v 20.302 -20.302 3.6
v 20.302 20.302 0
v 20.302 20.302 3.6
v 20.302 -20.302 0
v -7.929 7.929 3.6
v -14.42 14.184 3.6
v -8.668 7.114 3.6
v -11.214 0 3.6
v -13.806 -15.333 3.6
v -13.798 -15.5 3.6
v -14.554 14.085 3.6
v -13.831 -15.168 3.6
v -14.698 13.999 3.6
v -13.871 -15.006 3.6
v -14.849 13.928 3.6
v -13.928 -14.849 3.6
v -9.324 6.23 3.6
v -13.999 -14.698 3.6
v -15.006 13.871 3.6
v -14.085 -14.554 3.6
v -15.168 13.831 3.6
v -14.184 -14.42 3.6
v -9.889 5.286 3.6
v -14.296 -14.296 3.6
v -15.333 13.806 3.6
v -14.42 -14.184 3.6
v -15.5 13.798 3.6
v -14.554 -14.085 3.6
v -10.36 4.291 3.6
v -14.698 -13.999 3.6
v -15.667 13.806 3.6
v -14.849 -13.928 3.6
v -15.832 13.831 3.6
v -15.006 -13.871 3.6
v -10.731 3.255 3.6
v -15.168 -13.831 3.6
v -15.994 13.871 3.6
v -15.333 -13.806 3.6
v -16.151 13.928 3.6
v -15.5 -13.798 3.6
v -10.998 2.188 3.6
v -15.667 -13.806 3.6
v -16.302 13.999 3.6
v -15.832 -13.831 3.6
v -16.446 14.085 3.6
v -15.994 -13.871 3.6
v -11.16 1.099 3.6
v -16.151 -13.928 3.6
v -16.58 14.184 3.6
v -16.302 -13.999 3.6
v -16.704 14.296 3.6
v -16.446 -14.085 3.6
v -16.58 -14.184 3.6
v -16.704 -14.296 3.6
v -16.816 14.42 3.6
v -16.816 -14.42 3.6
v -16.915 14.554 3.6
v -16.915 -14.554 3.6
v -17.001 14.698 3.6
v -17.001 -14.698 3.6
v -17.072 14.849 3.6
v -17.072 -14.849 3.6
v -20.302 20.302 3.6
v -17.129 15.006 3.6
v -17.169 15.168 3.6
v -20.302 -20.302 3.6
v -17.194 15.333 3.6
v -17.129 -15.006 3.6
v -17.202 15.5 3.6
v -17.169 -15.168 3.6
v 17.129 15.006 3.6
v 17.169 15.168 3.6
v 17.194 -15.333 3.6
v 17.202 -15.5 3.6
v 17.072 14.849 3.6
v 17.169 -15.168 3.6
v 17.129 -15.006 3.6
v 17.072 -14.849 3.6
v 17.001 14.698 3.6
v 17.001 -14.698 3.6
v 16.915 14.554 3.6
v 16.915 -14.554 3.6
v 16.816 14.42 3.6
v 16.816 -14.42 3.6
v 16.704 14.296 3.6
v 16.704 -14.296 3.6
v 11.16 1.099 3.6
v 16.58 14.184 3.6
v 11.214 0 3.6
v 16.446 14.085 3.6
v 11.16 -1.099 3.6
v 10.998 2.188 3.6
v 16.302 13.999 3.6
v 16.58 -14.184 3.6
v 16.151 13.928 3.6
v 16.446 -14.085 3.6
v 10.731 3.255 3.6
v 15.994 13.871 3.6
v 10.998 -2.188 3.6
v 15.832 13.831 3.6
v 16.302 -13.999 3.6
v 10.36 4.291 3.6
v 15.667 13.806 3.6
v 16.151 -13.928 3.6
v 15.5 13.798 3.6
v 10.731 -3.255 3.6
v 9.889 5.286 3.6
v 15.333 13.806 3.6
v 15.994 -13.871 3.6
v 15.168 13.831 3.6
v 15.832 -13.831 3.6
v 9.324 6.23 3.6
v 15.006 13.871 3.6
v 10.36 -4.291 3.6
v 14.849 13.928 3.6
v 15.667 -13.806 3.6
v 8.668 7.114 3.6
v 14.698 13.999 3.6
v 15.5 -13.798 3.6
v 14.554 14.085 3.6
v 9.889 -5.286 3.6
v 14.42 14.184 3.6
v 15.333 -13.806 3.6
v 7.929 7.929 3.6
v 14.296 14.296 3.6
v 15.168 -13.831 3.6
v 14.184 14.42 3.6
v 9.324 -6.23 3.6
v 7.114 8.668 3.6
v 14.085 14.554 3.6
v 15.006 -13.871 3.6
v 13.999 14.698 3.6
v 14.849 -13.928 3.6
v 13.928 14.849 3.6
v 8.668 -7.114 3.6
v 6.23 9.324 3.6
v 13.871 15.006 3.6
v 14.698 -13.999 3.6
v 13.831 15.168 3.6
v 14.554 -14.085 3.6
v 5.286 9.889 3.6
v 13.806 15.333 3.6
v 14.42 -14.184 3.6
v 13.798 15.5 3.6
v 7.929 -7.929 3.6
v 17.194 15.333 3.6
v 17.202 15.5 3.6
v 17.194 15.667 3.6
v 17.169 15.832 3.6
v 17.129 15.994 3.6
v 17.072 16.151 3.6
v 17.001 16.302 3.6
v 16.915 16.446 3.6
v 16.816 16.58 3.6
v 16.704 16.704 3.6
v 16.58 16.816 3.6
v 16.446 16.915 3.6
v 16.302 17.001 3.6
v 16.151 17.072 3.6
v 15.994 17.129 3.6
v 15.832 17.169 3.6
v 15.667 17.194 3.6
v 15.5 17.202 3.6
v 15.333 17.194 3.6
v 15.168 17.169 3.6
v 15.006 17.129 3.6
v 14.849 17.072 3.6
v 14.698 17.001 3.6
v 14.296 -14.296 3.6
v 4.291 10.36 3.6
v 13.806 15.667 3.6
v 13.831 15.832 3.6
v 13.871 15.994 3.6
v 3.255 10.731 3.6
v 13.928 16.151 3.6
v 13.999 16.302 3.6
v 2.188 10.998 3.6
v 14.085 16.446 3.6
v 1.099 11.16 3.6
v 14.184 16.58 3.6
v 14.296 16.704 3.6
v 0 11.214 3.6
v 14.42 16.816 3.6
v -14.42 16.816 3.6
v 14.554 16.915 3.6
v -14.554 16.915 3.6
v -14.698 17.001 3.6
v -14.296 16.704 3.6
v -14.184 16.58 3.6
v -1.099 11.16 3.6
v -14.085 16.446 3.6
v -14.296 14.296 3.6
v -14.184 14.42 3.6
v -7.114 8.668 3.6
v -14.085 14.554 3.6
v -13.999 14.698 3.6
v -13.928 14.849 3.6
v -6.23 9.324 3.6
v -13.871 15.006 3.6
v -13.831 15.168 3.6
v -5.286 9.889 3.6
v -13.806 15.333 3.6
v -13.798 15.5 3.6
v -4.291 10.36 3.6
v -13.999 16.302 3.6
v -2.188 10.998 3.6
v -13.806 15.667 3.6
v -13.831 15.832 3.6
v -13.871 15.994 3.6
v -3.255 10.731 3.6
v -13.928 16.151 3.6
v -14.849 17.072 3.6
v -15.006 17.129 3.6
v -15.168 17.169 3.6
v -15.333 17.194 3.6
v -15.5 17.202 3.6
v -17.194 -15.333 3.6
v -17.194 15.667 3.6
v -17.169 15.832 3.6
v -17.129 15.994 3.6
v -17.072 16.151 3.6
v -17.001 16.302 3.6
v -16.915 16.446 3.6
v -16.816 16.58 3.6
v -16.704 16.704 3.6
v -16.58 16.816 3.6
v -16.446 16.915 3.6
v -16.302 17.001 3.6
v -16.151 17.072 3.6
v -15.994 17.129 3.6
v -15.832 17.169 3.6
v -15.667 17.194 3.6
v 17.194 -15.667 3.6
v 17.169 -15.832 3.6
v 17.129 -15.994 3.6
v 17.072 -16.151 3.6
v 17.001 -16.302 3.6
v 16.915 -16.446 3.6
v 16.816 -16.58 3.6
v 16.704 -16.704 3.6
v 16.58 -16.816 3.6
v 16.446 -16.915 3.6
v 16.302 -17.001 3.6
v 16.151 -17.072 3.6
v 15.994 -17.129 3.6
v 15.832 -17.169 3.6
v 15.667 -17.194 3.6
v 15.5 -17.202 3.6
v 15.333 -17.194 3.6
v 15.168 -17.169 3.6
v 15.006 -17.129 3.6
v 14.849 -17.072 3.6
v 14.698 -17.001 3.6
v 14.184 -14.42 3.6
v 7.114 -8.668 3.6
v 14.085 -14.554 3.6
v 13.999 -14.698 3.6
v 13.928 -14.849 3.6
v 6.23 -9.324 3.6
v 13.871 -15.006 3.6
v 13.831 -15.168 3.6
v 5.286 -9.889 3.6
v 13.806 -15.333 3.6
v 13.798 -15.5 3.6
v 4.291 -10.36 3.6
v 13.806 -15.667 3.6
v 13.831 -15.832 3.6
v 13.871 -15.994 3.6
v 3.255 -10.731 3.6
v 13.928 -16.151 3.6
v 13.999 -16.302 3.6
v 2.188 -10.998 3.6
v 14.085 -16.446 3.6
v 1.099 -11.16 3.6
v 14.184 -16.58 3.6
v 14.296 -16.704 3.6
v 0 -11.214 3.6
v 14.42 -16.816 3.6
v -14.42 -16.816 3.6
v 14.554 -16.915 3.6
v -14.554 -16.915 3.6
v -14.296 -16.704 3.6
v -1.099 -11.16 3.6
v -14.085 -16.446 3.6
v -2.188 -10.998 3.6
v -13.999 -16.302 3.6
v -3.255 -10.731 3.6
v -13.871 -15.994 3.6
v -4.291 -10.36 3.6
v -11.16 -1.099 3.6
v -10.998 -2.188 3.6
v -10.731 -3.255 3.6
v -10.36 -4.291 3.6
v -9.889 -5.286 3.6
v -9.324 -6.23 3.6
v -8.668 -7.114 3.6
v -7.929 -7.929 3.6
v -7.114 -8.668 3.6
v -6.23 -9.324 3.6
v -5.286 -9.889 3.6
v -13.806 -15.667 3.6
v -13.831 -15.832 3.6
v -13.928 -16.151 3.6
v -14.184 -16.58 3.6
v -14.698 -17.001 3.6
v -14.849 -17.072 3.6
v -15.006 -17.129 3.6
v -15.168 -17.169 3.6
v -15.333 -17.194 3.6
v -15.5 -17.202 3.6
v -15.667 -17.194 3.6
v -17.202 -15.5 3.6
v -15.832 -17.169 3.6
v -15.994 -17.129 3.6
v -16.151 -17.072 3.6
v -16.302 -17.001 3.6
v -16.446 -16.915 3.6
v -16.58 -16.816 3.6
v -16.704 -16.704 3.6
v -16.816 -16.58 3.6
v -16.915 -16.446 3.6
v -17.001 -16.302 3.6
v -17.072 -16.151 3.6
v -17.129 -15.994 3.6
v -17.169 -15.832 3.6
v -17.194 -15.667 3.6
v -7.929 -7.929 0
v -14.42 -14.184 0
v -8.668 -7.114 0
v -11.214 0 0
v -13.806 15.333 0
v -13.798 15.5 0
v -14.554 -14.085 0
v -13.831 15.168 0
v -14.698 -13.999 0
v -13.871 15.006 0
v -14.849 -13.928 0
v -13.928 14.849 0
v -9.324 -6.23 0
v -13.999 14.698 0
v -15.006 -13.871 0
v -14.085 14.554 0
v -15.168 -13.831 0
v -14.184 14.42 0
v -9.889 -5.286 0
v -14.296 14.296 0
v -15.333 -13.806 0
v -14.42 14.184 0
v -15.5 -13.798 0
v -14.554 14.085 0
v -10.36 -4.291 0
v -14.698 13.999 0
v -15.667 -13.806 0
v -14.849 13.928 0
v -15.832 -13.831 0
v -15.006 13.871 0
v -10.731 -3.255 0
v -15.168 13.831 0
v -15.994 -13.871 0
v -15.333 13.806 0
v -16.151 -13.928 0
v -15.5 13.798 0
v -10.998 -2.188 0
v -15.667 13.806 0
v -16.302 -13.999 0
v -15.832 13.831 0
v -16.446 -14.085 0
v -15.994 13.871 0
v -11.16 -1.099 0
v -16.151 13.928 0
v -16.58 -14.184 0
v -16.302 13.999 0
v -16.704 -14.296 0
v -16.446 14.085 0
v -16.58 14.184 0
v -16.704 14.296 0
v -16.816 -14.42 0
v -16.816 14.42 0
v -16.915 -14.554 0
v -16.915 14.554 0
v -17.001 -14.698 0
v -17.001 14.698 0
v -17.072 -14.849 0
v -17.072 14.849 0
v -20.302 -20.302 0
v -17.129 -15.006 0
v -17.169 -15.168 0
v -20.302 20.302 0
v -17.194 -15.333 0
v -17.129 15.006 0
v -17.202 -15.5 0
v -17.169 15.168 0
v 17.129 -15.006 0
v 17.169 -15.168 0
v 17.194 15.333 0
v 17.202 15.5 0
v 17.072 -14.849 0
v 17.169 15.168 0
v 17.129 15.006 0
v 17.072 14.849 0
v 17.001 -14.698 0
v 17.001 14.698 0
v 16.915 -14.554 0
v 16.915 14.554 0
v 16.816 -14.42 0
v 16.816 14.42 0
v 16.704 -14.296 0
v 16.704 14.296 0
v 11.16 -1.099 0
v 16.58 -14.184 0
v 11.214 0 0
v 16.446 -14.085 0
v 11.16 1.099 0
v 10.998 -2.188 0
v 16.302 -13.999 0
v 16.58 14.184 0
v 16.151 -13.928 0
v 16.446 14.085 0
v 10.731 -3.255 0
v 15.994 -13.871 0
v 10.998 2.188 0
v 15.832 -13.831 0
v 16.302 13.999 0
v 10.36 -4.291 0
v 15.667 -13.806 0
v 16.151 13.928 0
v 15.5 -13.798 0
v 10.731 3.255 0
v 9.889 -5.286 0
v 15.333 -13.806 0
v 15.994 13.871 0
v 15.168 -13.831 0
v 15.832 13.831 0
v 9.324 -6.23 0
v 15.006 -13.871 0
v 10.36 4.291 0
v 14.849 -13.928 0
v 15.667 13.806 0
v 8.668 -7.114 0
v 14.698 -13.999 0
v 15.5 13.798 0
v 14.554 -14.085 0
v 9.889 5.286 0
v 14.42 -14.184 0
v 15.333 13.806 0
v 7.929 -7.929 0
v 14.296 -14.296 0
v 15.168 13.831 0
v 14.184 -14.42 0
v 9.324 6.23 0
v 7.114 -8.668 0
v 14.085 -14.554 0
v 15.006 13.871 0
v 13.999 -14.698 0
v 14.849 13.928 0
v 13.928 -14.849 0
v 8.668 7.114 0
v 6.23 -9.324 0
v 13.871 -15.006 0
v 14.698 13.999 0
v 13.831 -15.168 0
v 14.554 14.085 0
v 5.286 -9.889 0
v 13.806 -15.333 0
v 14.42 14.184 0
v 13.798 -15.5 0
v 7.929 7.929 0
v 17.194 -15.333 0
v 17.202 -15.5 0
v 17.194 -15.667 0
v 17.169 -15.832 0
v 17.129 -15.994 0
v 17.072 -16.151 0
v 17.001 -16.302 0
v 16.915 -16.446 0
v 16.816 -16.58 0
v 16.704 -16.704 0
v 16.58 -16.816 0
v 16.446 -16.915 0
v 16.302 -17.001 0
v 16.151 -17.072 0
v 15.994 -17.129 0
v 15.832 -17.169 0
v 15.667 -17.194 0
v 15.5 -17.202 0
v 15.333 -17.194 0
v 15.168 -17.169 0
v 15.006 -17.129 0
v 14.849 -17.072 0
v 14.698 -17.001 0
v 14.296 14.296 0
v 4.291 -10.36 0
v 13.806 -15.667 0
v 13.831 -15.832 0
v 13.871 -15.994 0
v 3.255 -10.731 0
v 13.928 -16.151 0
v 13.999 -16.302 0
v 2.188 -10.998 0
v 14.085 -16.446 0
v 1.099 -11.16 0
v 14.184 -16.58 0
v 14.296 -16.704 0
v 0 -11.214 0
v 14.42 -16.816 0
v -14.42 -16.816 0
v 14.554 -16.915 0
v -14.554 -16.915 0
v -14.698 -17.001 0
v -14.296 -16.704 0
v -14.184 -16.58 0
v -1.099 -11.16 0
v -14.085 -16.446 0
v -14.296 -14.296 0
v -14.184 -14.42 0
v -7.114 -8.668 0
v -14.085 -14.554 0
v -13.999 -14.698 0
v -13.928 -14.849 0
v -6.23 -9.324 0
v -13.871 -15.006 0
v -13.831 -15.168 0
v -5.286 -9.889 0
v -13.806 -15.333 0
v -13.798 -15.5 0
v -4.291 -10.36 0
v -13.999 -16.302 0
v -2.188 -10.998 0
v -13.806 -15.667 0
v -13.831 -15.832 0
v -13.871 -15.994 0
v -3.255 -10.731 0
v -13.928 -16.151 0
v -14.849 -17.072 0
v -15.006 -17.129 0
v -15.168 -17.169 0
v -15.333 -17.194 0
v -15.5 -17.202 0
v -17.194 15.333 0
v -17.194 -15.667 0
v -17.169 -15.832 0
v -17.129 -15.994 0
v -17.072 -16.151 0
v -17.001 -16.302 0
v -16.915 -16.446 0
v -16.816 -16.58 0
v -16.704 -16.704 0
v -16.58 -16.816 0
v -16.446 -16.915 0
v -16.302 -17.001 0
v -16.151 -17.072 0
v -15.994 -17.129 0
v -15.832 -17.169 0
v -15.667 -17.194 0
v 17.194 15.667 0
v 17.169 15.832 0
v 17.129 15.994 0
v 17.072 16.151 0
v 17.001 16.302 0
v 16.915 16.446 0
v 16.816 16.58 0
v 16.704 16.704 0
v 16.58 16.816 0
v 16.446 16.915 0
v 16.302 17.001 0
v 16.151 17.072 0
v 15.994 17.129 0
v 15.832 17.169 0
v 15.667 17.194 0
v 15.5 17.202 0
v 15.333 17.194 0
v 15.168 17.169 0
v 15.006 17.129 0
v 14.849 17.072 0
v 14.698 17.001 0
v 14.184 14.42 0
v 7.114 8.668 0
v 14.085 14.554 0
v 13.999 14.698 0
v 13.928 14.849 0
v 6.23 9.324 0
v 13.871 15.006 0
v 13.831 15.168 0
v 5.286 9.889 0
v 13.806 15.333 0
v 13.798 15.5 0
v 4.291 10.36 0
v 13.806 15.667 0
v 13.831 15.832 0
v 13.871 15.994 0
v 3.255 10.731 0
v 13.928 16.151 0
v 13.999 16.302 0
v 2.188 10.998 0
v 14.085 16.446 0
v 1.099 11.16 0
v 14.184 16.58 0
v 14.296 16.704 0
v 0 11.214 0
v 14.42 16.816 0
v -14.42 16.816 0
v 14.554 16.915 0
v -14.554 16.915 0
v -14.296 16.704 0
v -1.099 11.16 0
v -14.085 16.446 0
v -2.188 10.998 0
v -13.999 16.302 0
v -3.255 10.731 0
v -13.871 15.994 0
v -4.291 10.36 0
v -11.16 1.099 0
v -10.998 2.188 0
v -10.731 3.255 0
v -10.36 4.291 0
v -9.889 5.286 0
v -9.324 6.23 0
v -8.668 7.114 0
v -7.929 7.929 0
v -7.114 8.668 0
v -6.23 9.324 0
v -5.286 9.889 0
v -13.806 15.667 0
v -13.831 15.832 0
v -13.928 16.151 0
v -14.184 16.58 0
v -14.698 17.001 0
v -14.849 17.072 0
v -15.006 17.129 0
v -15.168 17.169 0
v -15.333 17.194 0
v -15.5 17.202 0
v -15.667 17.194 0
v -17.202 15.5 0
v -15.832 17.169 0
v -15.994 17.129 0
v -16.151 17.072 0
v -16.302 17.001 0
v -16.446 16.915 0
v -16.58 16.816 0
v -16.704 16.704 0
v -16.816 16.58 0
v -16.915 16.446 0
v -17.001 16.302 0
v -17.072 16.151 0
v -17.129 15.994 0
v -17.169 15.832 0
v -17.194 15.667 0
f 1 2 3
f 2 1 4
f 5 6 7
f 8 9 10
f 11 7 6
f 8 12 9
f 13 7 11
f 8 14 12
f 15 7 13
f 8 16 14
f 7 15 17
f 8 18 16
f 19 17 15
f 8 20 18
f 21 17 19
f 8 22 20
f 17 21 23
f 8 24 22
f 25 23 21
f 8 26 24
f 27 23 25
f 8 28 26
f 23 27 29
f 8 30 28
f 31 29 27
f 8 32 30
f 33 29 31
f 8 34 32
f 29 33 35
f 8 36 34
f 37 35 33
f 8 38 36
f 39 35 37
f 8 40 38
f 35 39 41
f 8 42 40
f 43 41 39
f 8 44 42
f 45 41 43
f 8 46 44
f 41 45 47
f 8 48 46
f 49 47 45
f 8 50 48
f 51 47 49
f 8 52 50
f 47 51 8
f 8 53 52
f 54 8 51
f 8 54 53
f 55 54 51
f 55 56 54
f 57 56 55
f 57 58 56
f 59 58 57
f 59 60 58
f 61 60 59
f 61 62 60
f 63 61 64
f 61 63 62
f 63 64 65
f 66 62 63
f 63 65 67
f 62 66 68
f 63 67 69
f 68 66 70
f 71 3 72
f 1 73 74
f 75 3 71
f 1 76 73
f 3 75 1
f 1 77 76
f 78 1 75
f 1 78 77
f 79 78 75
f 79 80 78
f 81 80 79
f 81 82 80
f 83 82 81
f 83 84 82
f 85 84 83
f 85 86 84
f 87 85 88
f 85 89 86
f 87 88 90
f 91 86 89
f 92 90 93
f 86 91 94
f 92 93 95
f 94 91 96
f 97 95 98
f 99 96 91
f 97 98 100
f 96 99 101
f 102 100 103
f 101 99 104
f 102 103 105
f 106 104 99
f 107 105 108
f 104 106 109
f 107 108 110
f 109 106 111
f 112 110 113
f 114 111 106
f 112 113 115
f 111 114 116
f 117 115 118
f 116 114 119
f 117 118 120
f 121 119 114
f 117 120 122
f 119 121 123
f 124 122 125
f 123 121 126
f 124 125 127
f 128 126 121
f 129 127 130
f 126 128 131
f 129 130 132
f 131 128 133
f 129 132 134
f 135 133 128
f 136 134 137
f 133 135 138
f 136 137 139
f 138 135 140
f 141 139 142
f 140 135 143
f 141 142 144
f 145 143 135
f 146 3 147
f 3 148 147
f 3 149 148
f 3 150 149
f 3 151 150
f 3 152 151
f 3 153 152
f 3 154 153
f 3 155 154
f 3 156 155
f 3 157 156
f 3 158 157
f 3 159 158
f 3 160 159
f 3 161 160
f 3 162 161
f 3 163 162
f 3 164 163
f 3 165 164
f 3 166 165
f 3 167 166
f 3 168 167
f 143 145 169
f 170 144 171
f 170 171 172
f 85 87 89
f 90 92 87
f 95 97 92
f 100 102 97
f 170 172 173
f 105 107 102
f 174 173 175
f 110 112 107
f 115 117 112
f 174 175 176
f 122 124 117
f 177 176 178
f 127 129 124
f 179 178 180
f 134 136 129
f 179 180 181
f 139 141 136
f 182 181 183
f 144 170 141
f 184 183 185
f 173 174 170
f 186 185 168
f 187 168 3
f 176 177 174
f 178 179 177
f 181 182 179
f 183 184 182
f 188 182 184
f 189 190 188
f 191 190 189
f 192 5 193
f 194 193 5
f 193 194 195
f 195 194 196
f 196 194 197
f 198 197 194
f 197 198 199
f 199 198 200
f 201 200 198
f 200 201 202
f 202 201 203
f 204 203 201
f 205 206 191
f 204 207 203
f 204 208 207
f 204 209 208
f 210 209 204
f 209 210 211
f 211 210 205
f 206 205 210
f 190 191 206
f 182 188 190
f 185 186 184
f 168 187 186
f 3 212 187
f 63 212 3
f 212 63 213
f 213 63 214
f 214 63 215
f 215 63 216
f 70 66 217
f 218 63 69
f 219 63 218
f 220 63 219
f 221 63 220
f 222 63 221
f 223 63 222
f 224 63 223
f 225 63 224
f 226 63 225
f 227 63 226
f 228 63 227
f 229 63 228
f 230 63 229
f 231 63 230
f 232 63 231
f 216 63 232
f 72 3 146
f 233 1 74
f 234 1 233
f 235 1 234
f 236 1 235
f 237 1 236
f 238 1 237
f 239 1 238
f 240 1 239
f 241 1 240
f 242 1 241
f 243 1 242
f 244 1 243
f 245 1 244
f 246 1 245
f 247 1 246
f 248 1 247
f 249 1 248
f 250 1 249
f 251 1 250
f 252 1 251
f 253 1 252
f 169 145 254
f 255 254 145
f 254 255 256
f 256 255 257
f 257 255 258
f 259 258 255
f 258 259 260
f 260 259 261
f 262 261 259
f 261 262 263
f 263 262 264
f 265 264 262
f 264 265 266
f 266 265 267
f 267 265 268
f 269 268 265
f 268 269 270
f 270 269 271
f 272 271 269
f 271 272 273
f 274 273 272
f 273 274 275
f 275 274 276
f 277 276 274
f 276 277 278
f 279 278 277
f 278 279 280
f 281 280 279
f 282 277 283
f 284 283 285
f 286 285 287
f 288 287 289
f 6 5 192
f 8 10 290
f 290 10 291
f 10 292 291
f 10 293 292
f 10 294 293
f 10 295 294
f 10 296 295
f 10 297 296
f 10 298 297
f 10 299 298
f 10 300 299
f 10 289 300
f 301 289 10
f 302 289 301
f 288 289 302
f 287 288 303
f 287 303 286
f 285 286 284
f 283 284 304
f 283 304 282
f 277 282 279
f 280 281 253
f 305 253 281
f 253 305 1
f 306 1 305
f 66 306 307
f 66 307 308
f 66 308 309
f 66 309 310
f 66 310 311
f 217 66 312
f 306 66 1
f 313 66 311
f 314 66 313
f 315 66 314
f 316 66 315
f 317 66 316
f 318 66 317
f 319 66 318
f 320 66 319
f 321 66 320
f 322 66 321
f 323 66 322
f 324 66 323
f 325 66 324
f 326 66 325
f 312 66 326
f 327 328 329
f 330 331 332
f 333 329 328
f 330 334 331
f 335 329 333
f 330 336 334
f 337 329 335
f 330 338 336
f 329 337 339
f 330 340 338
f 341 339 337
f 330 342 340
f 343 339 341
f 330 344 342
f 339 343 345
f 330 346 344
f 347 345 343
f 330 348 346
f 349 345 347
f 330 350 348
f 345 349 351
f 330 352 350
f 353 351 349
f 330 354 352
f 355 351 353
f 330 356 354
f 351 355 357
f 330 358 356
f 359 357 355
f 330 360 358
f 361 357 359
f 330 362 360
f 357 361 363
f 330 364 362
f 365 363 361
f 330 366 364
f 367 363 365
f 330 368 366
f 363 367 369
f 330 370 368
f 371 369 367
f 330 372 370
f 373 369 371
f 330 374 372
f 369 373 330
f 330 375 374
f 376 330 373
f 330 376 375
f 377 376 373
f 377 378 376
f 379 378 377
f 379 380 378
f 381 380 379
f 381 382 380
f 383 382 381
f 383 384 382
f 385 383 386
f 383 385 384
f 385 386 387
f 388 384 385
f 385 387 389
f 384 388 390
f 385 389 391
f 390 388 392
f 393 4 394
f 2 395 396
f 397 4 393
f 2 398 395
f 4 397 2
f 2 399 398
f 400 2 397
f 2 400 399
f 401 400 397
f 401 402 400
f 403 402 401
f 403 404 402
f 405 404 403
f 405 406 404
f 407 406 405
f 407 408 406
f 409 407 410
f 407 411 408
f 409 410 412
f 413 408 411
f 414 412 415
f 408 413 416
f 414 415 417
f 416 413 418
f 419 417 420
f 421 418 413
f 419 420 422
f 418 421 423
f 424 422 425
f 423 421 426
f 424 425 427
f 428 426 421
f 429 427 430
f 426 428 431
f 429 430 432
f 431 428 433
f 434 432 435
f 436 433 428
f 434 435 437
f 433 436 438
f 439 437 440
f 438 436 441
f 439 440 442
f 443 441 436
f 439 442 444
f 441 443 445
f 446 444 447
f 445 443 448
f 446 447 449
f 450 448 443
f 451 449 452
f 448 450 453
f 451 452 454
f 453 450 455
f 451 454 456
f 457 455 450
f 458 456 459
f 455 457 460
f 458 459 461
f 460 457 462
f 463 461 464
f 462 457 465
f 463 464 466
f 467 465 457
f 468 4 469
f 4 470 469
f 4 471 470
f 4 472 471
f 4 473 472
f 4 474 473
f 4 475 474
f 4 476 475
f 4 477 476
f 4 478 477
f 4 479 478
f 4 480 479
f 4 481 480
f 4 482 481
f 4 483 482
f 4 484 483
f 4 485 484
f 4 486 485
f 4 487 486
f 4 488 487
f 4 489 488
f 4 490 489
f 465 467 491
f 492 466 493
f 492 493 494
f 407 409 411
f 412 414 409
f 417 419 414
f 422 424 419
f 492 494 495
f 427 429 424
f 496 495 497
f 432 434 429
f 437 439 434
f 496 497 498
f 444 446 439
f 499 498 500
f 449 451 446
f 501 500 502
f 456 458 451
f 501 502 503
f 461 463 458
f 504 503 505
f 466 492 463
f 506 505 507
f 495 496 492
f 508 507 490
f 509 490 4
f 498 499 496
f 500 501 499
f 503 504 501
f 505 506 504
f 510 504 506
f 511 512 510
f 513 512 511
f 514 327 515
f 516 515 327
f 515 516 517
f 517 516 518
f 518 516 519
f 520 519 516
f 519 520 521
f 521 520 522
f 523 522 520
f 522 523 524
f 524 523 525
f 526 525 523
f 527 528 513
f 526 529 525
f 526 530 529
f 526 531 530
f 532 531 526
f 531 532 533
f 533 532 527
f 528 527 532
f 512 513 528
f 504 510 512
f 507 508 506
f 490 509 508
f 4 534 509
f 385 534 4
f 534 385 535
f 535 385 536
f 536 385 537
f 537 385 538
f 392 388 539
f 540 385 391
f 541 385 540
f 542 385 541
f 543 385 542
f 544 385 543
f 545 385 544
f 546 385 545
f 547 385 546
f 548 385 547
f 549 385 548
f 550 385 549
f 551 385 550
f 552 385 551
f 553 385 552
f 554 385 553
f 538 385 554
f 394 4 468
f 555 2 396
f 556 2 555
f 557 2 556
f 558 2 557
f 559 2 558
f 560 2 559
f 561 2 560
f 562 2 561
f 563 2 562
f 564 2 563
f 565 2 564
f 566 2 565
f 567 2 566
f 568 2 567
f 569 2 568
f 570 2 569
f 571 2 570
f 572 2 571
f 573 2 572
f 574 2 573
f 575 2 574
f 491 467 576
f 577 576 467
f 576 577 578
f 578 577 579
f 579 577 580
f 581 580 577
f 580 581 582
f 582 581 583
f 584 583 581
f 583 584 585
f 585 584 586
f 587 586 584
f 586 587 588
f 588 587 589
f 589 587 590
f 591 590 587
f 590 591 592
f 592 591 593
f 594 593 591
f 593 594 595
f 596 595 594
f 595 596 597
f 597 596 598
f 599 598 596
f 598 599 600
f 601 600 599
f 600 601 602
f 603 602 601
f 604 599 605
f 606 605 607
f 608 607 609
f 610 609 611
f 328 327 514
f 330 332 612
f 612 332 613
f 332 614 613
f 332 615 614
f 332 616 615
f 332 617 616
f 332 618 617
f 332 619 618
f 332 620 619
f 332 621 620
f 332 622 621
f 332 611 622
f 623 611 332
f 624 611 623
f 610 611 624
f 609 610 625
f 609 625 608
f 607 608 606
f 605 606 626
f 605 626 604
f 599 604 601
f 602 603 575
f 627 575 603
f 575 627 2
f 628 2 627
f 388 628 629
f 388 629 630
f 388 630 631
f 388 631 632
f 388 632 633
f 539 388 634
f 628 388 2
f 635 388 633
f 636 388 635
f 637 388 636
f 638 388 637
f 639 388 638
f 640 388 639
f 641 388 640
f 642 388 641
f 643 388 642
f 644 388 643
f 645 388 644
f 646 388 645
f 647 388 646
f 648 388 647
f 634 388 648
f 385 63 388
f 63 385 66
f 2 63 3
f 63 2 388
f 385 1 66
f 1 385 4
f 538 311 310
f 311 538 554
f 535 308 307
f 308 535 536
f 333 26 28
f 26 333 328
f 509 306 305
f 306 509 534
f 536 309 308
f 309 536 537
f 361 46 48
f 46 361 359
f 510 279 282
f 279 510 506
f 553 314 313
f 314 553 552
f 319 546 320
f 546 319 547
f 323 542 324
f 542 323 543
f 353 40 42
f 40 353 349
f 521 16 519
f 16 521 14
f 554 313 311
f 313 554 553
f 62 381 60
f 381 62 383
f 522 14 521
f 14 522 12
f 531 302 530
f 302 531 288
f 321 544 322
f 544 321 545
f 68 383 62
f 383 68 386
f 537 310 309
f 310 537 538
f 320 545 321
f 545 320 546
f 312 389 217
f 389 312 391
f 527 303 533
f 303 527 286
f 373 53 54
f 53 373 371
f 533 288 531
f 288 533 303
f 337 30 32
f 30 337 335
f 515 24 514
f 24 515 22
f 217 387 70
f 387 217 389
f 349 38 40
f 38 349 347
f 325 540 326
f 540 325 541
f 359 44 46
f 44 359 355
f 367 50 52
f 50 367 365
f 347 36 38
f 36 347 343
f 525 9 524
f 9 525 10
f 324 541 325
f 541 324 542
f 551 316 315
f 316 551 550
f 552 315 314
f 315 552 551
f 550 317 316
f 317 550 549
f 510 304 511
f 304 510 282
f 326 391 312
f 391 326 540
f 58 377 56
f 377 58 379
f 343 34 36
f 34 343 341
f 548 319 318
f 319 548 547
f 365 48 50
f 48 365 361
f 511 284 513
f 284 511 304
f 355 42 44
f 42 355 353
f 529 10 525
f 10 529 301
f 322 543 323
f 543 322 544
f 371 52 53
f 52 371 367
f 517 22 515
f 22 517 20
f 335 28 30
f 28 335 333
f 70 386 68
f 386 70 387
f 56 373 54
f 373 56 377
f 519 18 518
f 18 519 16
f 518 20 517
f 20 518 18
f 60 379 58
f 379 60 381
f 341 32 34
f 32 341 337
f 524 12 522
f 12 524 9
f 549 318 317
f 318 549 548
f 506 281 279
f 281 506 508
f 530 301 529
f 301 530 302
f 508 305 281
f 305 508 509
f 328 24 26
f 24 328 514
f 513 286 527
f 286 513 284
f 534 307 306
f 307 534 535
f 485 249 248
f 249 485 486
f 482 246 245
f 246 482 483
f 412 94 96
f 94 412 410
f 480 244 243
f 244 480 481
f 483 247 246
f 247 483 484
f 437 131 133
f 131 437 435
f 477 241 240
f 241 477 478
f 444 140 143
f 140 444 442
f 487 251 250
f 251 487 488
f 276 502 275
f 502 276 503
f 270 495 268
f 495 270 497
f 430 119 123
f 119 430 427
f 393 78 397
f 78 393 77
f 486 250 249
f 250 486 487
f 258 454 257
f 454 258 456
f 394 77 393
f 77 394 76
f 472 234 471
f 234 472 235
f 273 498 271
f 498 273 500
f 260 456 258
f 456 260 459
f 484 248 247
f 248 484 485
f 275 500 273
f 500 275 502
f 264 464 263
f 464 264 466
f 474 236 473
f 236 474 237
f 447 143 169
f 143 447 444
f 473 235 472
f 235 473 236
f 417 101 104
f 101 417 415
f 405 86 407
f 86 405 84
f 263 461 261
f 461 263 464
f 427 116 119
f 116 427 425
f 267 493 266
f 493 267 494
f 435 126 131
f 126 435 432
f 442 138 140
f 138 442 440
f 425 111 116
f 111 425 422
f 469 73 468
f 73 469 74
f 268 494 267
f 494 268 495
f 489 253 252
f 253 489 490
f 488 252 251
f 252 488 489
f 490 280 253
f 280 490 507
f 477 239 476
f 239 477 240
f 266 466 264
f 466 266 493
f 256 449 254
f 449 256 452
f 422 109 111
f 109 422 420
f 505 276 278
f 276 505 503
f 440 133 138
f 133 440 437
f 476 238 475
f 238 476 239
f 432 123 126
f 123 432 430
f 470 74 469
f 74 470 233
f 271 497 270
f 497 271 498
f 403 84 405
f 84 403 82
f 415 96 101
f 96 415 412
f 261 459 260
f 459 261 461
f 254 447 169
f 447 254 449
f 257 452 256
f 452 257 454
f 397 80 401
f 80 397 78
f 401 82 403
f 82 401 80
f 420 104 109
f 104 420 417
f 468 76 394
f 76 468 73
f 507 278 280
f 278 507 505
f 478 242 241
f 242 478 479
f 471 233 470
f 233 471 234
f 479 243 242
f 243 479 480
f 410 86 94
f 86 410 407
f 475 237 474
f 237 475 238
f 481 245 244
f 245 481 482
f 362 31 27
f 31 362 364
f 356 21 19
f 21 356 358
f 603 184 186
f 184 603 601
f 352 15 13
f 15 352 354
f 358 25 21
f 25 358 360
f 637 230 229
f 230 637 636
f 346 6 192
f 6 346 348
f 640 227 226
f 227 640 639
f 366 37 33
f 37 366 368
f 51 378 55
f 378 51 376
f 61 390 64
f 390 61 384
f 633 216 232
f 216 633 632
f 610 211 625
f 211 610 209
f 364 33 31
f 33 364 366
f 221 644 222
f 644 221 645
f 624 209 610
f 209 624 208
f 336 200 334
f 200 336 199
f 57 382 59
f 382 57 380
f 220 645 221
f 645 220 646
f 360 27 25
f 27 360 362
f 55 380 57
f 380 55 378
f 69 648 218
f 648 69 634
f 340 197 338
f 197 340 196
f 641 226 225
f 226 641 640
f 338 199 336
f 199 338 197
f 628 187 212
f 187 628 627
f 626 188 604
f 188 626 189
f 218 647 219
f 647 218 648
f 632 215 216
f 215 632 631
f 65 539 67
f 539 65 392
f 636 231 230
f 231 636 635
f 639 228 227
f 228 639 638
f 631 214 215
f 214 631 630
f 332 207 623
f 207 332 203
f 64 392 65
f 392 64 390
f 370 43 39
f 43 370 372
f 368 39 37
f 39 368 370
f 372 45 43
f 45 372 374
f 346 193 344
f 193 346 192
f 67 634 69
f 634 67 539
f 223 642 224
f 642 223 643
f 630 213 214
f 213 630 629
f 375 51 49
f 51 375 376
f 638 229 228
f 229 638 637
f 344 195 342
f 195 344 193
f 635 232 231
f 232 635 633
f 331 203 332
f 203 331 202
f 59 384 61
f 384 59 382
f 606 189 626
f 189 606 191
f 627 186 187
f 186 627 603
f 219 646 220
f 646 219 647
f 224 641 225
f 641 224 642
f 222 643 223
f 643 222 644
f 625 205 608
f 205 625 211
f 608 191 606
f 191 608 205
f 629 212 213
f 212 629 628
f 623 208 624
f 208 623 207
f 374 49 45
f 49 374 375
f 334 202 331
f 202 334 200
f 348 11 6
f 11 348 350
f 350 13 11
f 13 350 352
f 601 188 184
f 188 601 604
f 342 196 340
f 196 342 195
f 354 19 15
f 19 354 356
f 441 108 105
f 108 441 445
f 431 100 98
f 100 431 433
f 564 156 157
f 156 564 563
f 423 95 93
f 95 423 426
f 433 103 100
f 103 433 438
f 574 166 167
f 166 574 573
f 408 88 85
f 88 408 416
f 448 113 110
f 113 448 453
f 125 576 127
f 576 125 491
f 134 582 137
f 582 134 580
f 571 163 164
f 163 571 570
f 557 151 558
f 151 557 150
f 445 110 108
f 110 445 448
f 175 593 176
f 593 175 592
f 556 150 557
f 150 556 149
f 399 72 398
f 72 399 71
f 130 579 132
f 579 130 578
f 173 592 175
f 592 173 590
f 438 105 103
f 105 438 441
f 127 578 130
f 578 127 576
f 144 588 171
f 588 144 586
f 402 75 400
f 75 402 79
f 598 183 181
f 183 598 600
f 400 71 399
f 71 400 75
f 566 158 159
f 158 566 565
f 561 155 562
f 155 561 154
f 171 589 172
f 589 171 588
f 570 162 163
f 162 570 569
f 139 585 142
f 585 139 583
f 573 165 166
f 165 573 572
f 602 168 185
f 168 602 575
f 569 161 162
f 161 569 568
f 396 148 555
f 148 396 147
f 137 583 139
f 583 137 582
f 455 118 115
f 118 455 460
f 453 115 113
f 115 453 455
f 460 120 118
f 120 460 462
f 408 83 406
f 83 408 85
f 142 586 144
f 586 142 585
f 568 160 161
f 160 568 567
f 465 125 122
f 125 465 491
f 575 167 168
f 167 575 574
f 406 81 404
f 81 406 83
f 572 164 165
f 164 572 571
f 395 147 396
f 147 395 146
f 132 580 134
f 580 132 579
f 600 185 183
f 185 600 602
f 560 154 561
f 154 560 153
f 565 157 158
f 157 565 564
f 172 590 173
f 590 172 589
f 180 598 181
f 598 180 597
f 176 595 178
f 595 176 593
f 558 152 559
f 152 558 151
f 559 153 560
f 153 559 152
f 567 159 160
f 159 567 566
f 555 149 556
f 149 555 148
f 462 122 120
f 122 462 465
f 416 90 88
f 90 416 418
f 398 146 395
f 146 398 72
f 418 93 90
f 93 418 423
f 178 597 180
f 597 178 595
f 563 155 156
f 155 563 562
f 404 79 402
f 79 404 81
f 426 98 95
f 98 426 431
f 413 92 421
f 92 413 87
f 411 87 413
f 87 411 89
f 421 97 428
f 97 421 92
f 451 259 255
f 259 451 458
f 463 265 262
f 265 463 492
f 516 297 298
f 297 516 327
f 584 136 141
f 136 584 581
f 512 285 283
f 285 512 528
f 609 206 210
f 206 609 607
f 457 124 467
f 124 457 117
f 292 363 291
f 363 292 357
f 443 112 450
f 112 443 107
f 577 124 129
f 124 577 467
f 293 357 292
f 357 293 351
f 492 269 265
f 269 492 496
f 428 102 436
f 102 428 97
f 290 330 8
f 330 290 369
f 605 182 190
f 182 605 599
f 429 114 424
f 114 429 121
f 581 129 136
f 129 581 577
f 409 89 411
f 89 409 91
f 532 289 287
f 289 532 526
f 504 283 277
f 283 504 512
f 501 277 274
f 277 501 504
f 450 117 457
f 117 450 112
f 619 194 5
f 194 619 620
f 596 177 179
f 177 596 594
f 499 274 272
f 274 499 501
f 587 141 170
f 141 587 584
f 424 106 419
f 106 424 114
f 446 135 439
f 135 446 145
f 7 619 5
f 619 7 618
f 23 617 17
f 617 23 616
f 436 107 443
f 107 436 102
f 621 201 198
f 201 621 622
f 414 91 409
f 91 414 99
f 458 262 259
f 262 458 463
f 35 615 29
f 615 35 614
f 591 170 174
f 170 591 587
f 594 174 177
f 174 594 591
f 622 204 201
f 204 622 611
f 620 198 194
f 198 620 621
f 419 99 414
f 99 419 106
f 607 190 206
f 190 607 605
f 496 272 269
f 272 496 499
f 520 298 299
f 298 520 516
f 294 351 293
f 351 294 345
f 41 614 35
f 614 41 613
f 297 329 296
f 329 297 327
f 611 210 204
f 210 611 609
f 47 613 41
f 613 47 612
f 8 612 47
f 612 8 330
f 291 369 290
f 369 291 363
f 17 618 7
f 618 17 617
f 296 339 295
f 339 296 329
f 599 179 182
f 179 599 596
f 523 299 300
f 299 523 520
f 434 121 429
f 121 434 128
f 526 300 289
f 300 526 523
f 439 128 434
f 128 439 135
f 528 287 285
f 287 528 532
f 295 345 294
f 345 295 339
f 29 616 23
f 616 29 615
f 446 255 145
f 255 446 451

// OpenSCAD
// render file: printed bodies, closed pose
// body plate
difference() {
  color("#4f81bd") union() {
    // body plate (plate)
    multmatrix([[1, 0, 0, 0], [0, 1, 0, 0], [0, 0, 1, 0], [0, 0, 0, 1]]) translate([-20.30205, -20.30205, 0]) cube([40.6041, 40.6041, 3.6]);
  }
  // cut slot_0 (bolt_slot)
  multmatrix([[1, 0, 0, -15.5], [0, 1, 0, -15.5], [0, 0, 1, -1], [0, 0, 0, 1]]) linear_extrude(height=5.6) polygon(points=[[0, -1.70205], [0.16683, -1.693854], [0.332054, -1.669346], [0.494079, -1.62876], [0.651346, -1.572489], [0.802341, -1.501074], [0.945608, -1.415203], [1.079769, -1.315703], [1.203531, -1.203531], [1.315703, -1.079769], [1.415203, -0.945608], [1.501074, -0.802341], [1.572489, -0.651346], [1.62876, -0.494079], [1.669346, -0.332054], [1.693854, -0.16683], [1.70205, 0], [1.70205, 0], [1.693854, 0.16683], [1.669346, 0.332054], [1.62876, 0.494079], [1.572489, 0.651346], [1.501074, 0.802341], [1.415203, 0.945608], [1.315703, 1.079769], [1.203531, 1.203531], [1.079769, 1.315703], [0.945608, 1.415203], [0.802341, 1.501074], [0.651346, 1.572489], [0.494079, 1.62876], [0.332054, 1.669346], [0.16683, 1.693854], [0, 1.70205], [0, 1.70205], [-0.16683, 1.693854], [-0.332054, 1.669346], [-0.494079, 1.62876], [-0.651346, 1.572489], [-0.802341, 1.501074], [-0.945608, 1.415203], [-1.079769, 1.315703], [-1.203531, 1.203531], [-1.315703, 1.079769], [-1.415203, 0.945608], [-1.501074, 0.802341], [-1.572489, 0.651346], [-1.62876, 0.494079], [-1.669346, 0.332054], [-1.693854, 0.16683], [-1.70205, 0], [-1.70205, 0], [-1.693854, -0.16683], [-1.669346, -0.332054], [-1.62876, -0.494079], [-1.572489, -0.651346], [-1.501074, -0.802341], [-1.415203, -0.945608], [-1.315703, -1.079769], [-1.203531, -1.203531], [-1.079769, -1.315703], [-0.945608, -1.415203], [-0.802341, -1.501074], [-0.651346, -1.572489], [-0.494079, -1.62876], [-0.332054, -1.669346], [-0.16683, -1.693854], [0, -1.70205]]);
  // cut slot_1 (bolt_slot)
  multmatrix([[1, 0, 0, 15.5], [0, 1, 0, -15.5], [0, 0, 1, -1], [0, 0, 0, 1]]) linear_extrude(height=5.6) polygon(points=[[0, -1.70205], [0.16683, -1.693854], [0.332054, -1.669346], [0.494079, -1.62876], [0.651346, -1.572489], [0.802341, -1.501074], [0.945608, -1.415203], [1.079769, -1.315703], [1.203531, -1.203531], [1.315703, -1.079769], [1.415203, -0.945608], [1.501074, -0.802341], [1.572489, -0.651346], [1.62876, -0.494079], [1.669346, -0.332054], [1.693854, -0.16683], [1.70205, 0], [1.70205, 0], [1.693854, 0.16683], [1.669346, 0.332054], [1.62876, 0.494079], [1.572489, 0.651346], [1.501074, 0.802341], [1.415203, 0.945608], [1.315703, 1.079769], [1.203531, 1.203531], [1.079769, 1.315703], [0.945608, 1.415203], [0.802341, 1.501074], [0.651346, 1.572489], [0.494079, 1.62876], [0.332054, 1.669346], [0.16683, 1.693854], [0, 1.70205], [0, 1.70205], [-0.16683, 1.693854], [-0.332054, 1.669346], [-0.494079, 1.62876], [-0.651346, 1.572489], [-0.802341, 1.501074], [-0.945608, 1.415203], [-1.079769, 1.315703], [-1.203531, 1.203531], [-1.315703, 1.079769], [-1.415203, 0.945608], [-1.501074, 0.802341], [-1.572489, 0.651346], [-1.62876, 0.494079], [-1.669346, 0.332054], [-1.693854, 0.16683], [-1.70205, 0], [-1.70205, 0], [-1.693854, -0.16683], [-1.669346, -0.332054], [-1.62876, -0.494079], [-1.572489, -0.651346], [-1.501074, -0.802341], [-1.415203, -0.945608], [-1.315703, -1.079769], [-1.203531, -1.203531], [-1.079769, -1.315703], [-0.945608, -1.415203], [-0.802341, -1.501074], [-0.651346, -1.572489], [-0.494079, -1.62876], [-0.332054, -1.669346], [-0.16683, -1.693854], [0, -1.70205]]);
  // cut slot_2 (bolt_slot)
  multmatrix([[1, 0, 0, -15.5], [0, 1, 0, 15.5], [0, 0, 1, -1], [0, 0, 0, 1]]) linear_extrude(height=5.6) polygon(points=[[0, -1.70205], [0.16683, -1.693854], [0.332054, -1.669346], [0.494079, -1.62876], [0.651346, -1.572489], [0.802341, -1.501074], [0.945608, -1.415203], [1.079769, -1.315703], [1.203531, -1.203531], [1.315703, -1.079769], [1.415203, -0.945608], [1.501074, -0.802341], [1.572489, -0.651346], [1.62876, -0.494079], [1.669346, -0.332054], [1.693854, -0.16683], [1.70205, 0], [1.70205, 0], [1.693854, 0.16683], [1.669346, 0.332054], [1.62876, 0.494079], [1.572489, 0.651346], [1.501074, 0.802341], [1.415203, 0.945608], [1.315703, 1.079769], [1.203531, 1.203531], [1.079769, 1.315703], [0.945608, 1.415203], [0.802341, 1.501074], [0.651346, 1.572489], [0.494079, 1.62876], [0.332054, 1.669346], [0.16683, 1.693854], [0, 1.70205], [0, 1.70205], [-0.16683, 1.693854], [-0.332054, 1.669346], [-0.494079, 1.62876], [-0.651346, 1.572489], [-0.802341, 1.501074], [-0.945608, 1.415203], [-1.079769, 1.315703], [-1.203531, 1.203531], [-1.315703, 1.079769], [-1.415203, 0.945608], [-1.501074, 0.802341], [-1.572489, 0.651346], [-1.62876, 0.494079], [-1.669346, 0.332054], [-1.693854, 0.16683], [-1.70205, 0], [-1.70205, 0], [-1.693854, -0.16683], [-1.669346, -0.332054], [-1.62876, -0.494079], [-1.572489, -0.651346], [-1.501074, -0.802341], [-1.415203, -0.945608], [-1.315703, -1.079769], [-1.203531, -1.203531], [-1.079769, -1.315703], [-0.945608, -1.415203], [-0.802341, -1.501074], [-0.651346, -1.572489], [-0.494079, -1.62876], [-0.332054, -1.669346], [-0.16683, -1.693854], [0, -1.70205]]);
  // cut slot_3 (bolt_slot)
  multmatrix([[1, 0, 0, 15.5], [0, 1, 0, 15.5], [0, 0, 1, -1], [0, 0, 0, 1]]) linear_extrude(height=5.6) polygon(points=[[0, -1.70205], [0.16683, -1.693854], [0.332054, -1.669346], [0.494079, -1.62876], [0.651346, -1.572489], [0.802341, -1.501074], [0.945608, -1.415203], [1.079769, -1.315703], [1.203531, -1.203531], [1.315703, -1.079769], [1.415203, -0.945608], [1.501074, -0.802341], [1.572489, -0.651346], [1.62876, -0.494079], [1.669346, -0.332054], [1.693854, -0.16683], [1.70205, 0], [1.70205, 0], [1.693854, 0.16683], [1.669346, 0.332054], [1.62876, 0.494079], [1.572489, 0.651346], [1.501074, 0.802341], [1.415203, 0.945608], [1.315703, 1.079769], [1.203531, 1.203531], [1.079769, 1.315703], [0.945608, 1.415203], [0.802341, 1.501074], [0.651346, 1.572489], [0.494079, 1.62876], [0.332054, 1.669346], [0.16683, 1.693854], [0, 1.70205], [0, 1.70205], [-0.16683, 1.693854], [-0.332054, 1.669346], [-0.494079, 1.62876], [-0.651346, 1.572489], [-0.802341, 1.501074], [-0.945608, 1.415203], [-1.079769, 1.315703], [-1.203531, 1.203531], [-1.315703, 1.079769], [-1.415203, 0.945608], [-1.501074, 0.802341], [-1.572489, 0.651346], [-1.62876, 0.494079], [-1.669346, 0.332054], [-1.693854, 0.16683], [-1.70205, 0], [-1.70205, 0], [-1.693854, -0.16683], [-1.669346, -0.332054], [-1.62876, -0.494079], [-1.572489, -0.651346], [-1.501074, -0.802341], [-1.415203, -0.945608], [-1.315703, -1.079769], [-1.203531, -1.203531], [-1.079769, -1.315703], [-0.945608, -1.415203], [-0.802341, -1.501074], [-0.651346, -1.572489], [-0.494079, -1.62876], [-0.332054, -1.669346], [-0.16683, -1.693854], [0, -1.70205]]);
  // cut clear_pilot (recess)
  multmatrix([[1, 0, 0, 0], [0, 1, 0, 0], [0, 0, 1, -1], [0, 0, 0, 1]]) cylinder(h=5.6, d=22.427014, $fn=64);
  // cut clear_shaft (recess)
  multmatrix([[1, 0, 0, 0], [0, 1, 0, 0], [0, 0, 1, -1], [0, 0, 0, 1]]) cylinder(h=5.6, d=5.406512, $fn=64);
}
